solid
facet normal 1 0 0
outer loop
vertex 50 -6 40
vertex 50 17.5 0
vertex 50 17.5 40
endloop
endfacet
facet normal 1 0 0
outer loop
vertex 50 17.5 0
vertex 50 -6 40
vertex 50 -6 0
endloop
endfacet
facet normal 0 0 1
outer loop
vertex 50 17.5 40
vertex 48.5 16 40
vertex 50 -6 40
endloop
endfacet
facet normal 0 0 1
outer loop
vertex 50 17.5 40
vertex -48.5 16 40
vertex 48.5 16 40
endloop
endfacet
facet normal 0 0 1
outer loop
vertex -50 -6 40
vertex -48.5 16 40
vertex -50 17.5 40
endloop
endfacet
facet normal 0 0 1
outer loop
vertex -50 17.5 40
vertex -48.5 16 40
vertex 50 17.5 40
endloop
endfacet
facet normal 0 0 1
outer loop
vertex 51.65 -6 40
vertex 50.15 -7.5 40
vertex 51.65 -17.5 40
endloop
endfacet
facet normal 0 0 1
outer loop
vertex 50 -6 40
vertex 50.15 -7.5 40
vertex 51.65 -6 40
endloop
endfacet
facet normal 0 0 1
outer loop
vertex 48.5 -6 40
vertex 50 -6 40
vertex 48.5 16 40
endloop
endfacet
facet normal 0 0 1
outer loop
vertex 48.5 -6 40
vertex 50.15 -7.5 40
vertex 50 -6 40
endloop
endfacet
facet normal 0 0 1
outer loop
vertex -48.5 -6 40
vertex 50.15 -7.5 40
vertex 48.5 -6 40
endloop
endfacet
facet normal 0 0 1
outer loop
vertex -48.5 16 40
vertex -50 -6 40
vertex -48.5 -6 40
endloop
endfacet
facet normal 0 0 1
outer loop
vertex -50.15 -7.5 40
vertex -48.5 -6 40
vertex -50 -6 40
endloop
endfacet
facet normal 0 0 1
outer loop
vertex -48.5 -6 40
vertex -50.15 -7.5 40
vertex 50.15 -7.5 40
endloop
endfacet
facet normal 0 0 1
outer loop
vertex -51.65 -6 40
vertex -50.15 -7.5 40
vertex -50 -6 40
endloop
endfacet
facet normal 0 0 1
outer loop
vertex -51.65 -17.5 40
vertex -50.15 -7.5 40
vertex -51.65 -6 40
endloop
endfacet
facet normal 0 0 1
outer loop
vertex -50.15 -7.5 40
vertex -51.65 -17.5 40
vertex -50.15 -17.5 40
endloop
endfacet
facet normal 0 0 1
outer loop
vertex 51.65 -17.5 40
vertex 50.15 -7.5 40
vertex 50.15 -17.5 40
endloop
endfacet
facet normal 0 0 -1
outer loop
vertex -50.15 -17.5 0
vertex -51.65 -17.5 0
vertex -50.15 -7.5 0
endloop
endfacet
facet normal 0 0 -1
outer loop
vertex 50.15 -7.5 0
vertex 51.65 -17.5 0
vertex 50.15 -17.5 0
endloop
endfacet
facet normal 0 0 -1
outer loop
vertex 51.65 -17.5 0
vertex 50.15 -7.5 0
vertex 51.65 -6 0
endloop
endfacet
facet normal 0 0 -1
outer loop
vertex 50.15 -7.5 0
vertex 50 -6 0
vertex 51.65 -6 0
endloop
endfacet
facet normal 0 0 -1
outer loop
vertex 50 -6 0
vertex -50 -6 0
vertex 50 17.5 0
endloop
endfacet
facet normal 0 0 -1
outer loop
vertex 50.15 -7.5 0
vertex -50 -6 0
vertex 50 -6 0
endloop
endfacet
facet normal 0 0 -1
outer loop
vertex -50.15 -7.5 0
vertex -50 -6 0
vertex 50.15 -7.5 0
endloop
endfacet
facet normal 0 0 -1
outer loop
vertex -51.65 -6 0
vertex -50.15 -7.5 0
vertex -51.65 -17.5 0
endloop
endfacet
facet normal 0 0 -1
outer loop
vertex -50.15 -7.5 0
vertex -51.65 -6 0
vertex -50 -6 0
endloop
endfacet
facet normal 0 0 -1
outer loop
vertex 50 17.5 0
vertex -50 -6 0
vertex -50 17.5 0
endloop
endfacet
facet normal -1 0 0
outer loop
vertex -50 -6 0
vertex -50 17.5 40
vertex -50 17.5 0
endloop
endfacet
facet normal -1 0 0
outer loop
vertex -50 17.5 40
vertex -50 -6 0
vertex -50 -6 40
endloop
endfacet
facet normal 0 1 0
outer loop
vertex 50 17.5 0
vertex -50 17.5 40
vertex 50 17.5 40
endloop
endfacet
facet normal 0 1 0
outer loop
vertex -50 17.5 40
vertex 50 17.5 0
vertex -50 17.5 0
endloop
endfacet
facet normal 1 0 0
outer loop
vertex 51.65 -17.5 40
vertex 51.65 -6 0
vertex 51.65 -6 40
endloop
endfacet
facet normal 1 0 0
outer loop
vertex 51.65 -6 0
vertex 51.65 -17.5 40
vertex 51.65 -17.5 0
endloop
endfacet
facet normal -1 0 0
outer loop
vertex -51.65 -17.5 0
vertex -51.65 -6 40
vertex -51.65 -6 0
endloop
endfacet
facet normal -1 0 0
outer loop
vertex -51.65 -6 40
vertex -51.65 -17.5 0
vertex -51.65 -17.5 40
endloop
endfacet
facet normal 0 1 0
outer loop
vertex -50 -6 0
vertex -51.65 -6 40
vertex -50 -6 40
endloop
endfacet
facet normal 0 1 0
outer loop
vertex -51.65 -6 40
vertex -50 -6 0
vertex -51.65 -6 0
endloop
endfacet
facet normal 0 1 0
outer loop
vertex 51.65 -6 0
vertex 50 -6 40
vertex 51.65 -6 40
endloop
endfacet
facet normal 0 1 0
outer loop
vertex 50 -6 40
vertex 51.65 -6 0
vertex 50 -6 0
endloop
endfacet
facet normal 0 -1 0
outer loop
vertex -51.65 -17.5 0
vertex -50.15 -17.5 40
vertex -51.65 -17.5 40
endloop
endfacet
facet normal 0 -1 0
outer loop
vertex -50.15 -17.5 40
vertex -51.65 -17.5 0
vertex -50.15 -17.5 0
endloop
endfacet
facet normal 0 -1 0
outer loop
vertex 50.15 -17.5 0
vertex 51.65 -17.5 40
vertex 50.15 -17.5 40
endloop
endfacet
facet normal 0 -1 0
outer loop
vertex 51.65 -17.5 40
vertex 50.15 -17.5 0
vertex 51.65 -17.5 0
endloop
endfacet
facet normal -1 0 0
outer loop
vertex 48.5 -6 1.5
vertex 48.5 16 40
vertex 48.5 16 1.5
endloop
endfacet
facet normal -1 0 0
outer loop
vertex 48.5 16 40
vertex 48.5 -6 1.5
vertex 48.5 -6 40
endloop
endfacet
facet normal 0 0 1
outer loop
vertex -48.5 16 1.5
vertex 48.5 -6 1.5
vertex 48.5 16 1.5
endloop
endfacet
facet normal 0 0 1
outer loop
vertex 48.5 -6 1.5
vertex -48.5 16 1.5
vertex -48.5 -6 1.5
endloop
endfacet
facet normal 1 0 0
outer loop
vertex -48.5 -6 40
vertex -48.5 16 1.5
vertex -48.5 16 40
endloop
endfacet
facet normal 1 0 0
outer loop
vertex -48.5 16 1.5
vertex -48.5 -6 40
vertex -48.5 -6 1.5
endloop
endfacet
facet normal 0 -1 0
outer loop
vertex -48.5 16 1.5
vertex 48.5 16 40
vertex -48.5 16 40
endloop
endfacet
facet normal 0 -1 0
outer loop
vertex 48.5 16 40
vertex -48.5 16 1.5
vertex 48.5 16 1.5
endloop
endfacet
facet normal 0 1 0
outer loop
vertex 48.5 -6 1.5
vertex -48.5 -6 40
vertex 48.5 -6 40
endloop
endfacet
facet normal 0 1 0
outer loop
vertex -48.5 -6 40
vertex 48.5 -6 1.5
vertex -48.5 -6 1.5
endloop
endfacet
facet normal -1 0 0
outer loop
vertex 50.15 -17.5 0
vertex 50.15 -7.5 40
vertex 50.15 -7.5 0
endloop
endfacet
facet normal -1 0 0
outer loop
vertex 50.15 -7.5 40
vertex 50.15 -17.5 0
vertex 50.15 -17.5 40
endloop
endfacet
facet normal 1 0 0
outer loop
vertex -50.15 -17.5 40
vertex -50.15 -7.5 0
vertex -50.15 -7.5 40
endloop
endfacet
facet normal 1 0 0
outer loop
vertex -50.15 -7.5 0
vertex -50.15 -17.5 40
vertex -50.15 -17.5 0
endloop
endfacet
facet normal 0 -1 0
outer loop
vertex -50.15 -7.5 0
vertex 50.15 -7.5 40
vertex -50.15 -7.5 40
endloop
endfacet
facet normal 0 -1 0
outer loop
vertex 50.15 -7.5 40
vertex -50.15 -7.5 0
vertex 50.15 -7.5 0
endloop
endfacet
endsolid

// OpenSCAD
//
// Card organizer for Android: Netrunner LCG
//
// Copyright 2014 Magnus Kvevlander <magu@me.com>
//
// Creative Commons Attribution-NonCommercial 3.0 Unported (CC BY-NC 3.0)
// http://creativecommons.org/licenses/by-nc/3.0/
//

// Size of hole on the x axis
x = 97;
// Ditto on the y axis
y = 22;
// Height of the part
z = 40;

// Material thickness (1.5 sliced with 0.5 perimiters works perfect)
thk = 1.5;
// Length of gripping ledges (set to <= 0 for an edge piece without ledges altogether)
grip = 10;
// Tolerance of grip (0.15 gives a lean, but not to snug, fit; YMMV)
tol = 0.15;


// Measures of the fattest stack in the
// base game (with standard sleeves): 67x95x20 mm
// Default variables with a 1 mm gap around the
// stack for ease of insertion and extraction.

// Material thickness of 1.5 mm prints with perfect
// stability with perimiters of 0.5 mm.

// Default grip length and tolerance makes for a
// lean, but not deformingly snug, fit.

// Centering translation
translate ([-(thk + x / 2), -(thk + (y - grip) / 2), 0])
difference () {
	union () {
// Body boundary
		cube ([x + 2 * thk, y + 2 * thk, z]);
// Grip boundary
		if (grip > 0)
			translate ([-(thk + tol), -grip, 0])
				cube ([x + 4 * thk + 2 * tol, grip + thk, z]);
	}
// Cavity cutout
	translate ([thk, thk, thk])
		cube ([x, y, z]);
// Grip cutout
	translate ([-tol, -(grip + thk), -thk])
		cube ([x + 2 * thk + 2 * tol, grip + thk, z + 2 * thk]);
}
